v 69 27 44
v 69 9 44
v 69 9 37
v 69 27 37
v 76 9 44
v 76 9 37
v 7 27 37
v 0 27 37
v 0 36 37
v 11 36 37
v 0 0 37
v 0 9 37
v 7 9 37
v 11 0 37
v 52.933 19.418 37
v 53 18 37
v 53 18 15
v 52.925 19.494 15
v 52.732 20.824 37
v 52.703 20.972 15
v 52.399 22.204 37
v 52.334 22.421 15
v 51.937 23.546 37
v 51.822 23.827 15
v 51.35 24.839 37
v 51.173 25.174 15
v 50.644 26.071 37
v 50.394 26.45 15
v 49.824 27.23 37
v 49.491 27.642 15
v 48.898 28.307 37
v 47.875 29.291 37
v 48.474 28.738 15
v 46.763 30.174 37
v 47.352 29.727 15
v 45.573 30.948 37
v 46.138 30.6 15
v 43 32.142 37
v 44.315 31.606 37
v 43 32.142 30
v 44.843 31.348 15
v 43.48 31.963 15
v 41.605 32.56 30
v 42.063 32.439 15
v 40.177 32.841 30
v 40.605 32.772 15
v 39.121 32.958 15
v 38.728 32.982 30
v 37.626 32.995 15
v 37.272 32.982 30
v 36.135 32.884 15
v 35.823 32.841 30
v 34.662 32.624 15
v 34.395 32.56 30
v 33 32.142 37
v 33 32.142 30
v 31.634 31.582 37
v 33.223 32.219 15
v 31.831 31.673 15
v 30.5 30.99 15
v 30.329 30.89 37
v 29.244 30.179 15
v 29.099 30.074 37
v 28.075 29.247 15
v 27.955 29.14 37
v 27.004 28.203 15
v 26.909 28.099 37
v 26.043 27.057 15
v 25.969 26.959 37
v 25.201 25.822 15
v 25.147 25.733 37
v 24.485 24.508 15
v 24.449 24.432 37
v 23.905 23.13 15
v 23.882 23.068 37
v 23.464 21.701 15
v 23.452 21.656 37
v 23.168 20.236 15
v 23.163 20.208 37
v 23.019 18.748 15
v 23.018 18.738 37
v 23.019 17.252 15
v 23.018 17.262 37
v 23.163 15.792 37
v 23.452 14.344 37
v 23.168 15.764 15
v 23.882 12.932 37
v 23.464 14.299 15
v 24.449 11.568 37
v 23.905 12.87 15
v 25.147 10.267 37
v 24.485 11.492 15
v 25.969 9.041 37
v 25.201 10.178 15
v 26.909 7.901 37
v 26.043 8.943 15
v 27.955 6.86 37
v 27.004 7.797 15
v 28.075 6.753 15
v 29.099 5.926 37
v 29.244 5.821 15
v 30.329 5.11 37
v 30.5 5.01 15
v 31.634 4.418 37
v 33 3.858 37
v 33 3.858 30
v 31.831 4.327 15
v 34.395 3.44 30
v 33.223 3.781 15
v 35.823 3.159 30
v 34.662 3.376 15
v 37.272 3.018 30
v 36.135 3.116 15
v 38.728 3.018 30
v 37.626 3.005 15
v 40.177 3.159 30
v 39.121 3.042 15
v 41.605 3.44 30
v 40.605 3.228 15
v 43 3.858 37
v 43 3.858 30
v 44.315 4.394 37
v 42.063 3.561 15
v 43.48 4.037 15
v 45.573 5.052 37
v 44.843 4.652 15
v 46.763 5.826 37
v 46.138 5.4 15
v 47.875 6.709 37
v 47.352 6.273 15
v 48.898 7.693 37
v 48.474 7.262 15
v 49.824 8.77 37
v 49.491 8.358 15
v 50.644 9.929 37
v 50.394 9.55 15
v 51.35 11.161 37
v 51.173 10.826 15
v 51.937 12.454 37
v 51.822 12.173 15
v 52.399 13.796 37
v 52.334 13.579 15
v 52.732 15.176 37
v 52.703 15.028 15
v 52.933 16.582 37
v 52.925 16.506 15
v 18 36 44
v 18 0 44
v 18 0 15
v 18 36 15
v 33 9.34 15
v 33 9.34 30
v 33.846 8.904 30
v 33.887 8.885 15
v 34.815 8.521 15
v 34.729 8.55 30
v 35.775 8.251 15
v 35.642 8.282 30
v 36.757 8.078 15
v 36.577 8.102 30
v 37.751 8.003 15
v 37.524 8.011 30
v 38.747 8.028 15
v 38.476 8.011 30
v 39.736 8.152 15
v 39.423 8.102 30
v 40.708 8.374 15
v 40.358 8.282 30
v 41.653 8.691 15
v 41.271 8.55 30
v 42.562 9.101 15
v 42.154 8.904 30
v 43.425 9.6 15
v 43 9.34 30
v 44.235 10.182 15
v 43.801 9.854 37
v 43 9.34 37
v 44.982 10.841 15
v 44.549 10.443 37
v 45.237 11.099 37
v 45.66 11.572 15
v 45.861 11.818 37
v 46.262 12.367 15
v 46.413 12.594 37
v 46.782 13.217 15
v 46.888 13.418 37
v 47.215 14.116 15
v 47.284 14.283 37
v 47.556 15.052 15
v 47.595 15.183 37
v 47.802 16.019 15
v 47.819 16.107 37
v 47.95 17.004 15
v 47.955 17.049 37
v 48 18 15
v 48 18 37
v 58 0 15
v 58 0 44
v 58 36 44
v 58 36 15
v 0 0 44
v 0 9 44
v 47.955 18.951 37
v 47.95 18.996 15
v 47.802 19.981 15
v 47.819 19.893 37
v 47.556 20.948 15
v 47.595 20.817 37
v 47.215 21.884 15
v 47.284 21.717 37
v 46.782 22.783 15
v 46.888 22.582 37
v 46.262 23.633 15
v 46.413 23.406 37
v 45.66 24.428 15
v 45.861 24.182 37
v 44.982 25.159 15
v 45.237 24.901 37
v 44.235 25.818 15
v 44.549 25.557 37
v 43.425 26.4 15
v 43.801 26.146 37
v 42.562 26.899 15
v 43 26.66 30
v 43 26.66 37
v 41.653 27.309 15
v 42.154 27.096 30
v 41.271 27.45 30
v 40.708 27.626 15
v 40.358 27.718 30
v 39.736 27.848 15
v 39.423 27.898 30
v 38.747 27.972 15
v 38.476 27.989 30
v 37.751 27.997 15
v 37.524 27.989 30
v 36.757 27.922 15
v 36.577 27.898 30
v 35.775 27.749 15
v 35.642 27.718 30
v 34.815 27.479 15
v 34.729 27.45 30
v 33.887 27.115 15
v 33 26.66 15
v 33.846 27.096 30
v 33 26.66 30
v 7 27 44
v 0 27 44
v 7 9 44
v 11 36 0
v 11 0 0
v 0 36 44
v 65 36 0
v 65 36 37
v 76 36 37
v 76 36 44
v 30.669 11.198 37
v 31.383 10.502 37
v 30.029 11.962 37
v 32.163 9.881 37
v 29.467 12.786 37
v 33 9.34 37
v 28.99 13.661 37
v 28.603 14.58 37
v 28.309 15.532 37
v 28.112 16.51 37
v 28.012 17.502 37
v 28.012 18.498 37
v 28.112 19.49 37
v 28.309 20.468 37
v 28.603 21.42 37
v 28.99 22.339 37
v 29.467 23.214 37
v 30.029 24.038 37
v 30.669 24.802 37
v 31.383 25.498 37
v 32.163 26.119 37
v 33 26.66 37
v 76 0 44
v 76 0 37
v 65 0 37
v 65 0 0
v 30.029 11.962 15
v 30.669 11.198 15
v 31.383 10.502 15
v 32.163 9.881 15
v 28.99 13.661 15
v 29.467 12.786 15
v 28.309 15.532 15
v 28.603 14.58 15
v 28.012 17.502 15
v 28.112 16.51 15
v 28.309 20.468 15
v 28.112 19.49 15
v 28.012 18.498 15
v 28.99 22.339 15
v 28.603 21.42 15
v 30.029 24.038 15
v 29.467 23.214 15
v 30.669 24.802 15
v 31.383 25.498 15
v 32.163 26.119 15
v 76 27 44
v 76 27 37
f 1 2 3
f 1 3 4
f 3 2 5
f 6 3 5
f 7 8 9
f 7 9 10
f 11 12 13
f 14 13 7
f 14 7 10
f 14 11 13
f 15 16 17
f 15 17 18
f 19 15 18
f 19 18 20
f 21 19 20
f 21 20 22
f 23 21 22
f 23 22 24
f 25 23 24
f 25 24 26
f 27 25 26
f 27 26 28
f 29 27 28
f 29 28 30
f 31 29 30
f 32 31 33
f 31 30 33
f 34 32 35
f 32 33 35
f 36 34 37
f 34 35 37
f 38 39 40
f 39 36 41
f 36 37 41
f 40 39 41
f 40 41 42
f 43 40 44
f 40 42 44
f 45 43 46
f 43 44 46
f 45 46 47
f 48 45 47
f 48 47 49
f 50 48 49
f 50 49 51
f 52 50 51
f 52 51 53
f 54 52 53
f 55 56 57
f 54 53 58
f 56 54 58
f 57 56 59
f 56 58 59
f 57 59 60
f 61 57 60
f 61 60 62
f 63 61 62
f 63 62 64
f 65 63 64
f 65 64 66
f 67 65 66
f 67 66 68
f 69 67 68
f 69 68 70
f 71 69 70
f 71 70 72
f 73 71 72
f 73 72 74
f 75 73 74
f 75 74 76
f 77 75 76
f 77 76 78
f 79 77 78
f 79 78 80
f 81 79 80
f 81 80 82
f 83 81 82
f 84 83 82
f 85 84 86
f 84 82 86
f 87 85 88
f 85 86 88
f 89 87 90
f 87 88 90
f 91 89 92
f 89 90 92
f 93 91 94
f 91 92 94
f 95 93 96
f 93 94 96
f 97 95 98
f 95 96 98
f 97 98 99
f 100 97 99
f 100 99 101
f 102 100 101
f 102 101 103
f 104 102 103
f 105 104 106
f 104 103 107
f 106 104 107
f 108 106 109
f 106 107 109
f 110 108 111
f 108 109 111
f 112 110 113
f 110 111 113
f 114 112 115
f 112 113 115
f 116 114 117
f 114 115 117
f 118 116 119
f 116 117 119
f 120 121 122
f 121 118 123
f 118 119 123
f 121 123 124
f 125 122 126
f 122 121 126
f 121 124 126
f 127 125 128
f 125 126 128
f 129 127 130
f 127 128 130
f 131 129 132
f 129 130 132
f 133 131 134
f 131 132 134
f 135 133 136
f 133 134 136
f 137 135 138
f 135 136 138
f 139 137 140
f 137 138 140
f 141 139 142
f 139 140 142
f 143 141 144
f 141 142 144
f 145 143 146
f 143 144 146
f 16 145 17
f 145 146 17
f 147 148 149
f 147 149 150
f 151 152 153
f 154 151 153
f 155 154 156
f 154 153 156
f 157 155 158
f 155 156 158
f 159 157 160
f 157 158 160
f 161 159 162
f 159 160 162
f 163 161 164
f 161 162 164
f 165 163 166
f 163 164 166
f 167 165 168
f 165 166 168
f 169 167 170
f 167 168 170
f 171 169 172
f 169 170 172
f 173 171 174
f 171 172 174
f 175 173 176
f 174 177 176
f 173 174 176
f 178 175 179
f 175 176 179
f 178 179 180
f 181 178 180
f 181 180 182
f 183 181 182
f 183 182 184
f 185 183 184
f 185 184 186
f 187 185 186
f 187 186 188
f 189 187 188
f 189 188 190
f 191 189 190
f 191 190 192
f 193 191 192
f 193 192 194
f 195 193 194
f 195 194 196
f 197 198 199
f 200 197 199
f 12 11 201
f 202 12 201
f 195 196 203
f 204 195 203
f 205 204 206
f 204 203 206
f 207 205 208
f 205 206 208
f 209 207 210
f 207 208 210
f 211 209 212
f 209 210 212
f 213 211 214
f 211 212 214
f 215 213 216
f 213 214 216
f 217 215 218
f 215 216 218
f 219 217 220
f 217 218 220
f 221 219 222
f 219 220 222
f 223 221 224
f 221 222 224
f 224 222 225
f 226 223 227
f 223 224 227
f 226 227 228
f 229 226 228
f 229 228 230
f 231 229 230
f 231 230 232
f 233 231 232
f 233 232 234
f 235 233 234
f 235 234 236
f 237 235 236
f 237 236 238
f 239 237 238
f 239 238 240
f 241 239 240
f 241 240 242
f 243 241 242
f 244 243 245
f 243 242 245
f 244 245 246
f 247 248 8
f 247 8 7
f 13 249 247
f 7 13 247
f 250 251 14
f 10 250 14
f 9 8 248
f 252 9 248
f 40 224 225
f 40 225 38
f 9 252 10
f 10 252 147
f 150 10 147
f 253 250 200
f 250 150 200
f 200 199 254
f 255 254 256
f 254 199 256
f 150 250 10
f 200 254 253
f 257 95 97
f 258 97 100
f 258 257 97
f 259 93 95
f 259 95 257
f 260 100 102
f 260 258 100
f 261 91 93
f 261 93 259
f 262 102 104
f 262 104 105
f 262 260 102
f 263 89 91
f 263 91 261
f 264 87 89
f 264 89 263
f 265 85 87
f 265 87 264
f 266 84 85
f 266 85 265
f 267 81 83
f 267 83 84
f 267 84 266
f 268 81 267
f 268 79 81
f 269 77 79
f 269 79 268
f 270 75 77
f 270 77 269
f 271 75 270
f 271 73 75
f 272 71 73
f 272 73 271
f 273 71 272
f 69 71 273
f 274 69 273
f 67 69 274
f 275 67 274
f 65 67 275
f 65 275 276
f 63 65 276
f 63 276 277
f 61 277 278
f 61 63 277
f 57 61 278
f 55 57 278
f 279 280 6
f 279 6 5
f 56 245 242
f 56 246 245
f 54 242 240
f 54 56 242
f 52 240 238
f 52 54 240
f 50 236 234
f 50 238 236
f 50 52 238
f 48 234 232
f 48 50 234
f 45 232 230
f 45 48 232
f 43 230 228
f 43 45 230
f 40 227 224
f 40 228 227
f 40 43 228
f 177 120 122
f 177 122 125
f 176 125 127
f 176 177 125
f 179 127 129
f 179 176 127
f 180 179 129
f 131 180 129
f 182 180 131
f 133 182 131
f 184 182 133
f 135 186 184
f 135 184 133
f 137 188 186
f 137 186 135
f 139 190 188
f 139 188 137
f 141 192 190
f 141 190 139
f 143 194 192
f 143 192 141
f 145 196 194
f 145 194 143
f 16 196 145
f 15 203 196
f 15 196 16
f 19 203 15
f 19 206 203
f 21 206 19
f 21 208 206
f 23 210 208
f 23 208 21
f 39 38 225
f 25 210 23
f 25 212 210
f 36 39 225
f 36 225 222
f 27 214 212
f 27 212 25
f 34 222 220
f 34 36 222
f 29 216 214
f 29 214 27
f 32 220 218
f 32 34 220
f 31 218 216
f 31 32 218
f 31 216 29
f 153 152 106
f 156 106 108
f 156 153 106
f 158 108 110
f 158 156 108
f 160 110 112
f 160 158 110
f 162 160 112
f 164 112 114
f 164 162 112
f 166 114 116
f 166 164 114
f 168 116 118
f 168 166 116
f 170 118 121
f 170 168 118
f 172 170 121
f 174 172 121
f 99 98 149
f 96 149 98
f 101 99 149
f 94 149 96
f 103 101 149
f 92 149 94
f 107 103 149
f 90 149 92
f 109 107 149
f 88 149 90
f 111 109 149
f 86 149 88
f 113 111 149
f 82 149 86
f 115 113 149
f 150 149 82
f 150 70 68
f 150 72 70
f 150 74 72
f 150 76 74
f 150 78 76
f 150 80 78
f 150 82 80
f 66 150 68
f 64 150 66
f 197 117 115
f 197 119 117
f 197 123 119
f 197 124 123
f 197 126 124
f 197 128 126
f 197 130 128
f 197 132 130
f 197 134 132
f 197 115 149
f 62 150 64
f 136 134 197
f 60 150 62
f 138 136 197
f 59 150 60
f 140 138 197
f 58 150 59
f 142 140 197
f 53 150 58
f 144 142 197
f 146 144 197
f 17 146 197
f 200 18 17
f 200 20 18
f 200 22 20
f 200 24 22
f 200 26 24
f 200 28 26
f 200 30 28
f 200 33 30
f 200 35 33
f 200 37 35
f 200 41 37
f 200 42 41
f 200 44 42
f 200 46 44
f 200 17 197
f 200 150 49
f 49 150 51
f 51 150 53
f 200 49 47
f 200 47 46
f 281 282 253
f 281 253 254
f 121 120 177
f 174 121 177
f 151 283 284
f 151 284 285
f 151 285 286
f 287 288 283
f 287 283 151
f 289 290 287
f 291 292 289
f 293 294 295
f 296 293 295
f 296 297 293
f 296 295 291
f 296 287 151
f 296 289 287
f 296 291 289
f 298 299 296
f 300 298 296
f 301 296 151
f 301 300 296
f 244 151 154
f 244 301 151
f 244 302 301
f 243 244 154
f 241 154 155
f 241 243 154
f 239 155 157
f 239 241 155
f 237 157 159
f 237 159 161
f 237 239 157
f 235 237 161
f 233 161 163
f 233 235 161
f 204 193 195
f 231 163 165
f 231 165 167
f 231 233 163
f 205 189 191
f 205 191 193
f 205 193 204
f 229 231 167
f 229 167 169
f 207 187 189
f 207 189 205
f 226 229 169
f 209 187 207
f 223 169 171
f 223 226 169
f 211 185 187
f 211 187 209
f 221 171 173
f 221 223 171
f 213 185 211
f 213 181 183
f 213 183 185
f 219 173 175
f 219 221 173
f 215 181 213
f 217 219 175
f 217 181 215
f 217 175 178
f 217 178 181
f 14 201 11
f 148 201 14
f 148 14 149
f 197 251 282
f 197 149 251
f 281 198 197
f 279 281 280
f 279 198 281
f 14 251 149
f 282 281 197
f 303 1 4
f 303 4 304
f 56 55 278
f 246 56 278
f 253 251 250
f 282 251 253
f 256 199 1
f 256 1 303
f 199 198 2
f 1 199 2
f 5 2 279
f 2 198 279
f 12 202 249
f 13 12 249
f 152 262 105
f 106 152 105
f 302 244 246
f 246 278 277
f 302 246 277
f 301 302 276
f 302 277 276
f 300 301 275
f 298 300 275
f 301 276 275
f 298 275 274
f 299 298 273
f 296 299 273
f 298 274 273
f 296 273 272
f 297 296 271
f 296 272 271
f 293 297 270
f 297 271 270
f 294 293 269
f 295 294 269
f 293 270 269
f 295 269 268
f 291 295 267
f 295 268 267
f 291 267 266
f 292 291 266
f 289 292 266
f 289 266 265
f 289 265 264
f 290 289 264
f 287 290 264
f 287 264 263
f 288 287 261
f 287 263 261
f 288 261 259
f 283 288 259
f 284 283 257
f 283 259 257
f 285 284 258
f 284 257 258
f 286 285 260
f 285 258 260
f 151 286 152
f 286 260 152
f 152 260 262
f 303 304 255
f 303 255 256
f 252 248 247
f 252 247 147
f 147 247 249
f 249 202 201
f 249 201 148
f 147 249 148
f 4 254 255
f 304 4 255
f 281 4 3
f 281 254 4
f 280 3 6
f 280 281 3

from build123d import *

# Parameters (mm, degrees)
F0_W      = 76
F0_H      = 44
F1_DEPTH  = 36
F2_W      = 11
F2_H      = 37
F3_DEPTH  = 36
F4_W      = 7
F4_H      = 18
F4_W_2    = 40
F4_H_2    = 36
F5_DEPTH  = 29
F6_R      = 15
F7_DEPTH  = 22
F9_DEPTH  = 7
F11_DEPTH = 22


with BuildPart() as f1:
    # F0 (on Front) → F1 (new body)
    with BuildSketch(Plane.XZ):
        with Locations((38, 22)):
            Rectangle(F0_W, F0_H)
    extrude(amount=-F1_DEPTH)

    # F2 (on face) → F3 (cut)
    with BuildSketch(Plane.XZ):
        with Locations((5.5, 18.5)):
            Rectangle(F2_W, F2_H)
        with Locations((70.5, 18.5)):
            Rectangle(F2_W, F2_H)
    extrude(amount=-F3_DEPTH, mode=Mode.SUBTRACT)

    # F4 (on face) → F5 (cut)
    with BuildSketch(Plane.XY.offset(44)):
        with Locations((72.5, 18)):
            Rectangle(F4_W, F4_H)
        with Locations((38, 18)):
            Rectangle(F4_W_2, F4_H_2)
        with Locations((3.5, 18)):
            Rectangle(F4_W, F4_H)
    extrude(amount=-F5_DEPTH, mode=Mode.SUBTRACT)

    # F6 (on face) → F7 (join)
    with BuildSketch(Plane.XY.offset(15)):
        with Locations((38, 18)):
            Circle(F6_R)
    extrude(amount=F7_DEPTH)

    # F8 (on face) → F9 (cut)
    with BuildSketch(Plane.XY.offset(37)):
        with BuildLine():
            Line((43, 18), (38, 18))
            Line((38, 18), (38, 3))
            ThreePointArc((38, 3), (40.5365296809, 3.2160216052), (43, 3.8578643763))
            Line((43, 3.8578643763), (43, 18))
        make_face()
        with BuildLine():
            Line((38, 3), (38, 18))
            Line((38, 18), (43, 18))
            Line((43, 18), (43, 32.1421356237))
            ThreePointArc((43, 32.1421356237), (38, 33), (33, 32.1421356237))
            Line((33, 32.1421356237), (33, 3.8578643763))
            ThreePointArc((33, 3.8578643763), (35.4634703191, 3.2160216052), (38, 3))
        make_face()
        with BuildLine():
            ThreePointArc((33, 32.1421356237), (38, 33), (43, 32.1421356237))
            Line((43, 32.1421356237), (43, 36))
            Line((43, 36), (33, 36))
            Line((33, 36), (33, 32.1421356237))
        make_face()
        with BuildLine():
            ThreePointArc((43, 3.8578643763), (40.5365296809, 3.2160216052), (38, 3))
            Line((38, 3), (38, 0))
            Line((38, 0), (43, 0))
            Line((43, 0), (43, 3.8578643763))
        make_face()
        with BuildLine():
            Line((38, 0), (38, 3))
            ThreePointArc((38, 3), (35.4634703191, 3.2160216052), (33, 3.8578643763))
            Line((33, 3.8578643763), (33, 0))
            Line((33, 0), (38, 0))
        make_face()
    extrude(amount=-F9_DEPTH, mode=Mode.SUBTRACT)

    # F10 (on face) → F11 (cut)
    with BuildSketch(Plane.XY.offset(37)):
        with BuildLine():
            ThreePointArc((33, 9.3397459622), (43, 9.3397459622), (48, 18))
            ThreePointArc((48, 18), (43, 26.6602540378), (33, 26.6602540378))
            Line((33, 26.6602540378), (33, 9.3397459622))
        make_face()
        with BuildLine():
            Line((33, 9.3397459622), (33, 26.6602540378))
            ThreePointArc((33, 26.6602540378), (28, 18), (33, 9.3397459622))
        make_face()
    extrude(amount=-F11_DEPTH, mode=Mode.SUBTRACT)


solid = f1.part
